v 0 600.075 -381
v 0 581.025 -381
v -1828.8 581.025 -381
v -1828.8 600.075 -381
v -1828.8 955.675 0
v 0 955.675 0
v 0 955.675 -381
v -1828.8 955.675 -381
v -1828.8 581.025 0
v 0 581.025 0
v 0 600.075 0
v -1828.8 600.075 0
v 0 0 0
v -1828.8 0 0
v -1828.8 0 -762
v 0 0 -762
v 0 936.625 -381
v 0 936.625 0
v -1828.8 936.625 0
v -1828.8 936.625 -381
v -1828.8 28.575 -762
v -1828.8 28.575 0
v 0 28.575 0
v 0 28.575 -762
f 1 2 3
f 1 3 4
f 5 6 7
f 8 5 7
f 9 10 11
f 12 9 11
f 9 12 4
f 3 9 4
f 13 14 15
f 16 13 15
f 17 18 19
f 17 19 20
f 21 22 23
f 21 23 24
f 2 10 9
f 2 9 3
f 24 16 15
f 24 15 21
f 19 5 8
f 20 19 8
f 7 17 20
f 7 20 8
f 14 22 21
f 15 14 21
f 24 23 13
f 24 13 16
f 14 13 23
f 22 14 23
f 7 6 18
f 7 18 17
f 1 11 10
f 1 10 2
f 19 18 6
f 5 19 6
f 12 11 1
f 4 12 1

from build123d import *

# Parameters (mm, degrees)
SKETCH1_W             = 762
SKETCH1_H             = 28.575
BOSS_EXTRUDE1_DEPTH   = 1828.8
SKETCH1_W_2           = 381
SKETCH1_H_2           = 19.05
BOSS_EXTRUDE1_2_DEPTH = 1828.8
BOSS_EXTRUDE1_3_DEPTH = 1828.8


with BuildPart() as part:
    # Sketch1 → Boss-Extrude1 (new body)
    with BuildSketch(Plane(origin=(0, 0, 0), x_dir=(0, 0, -1), z_dir=(1, 0, 0))):
        with Locations((381, 14.2875)):
            Rectangle(SKETCH1_W, SKETCH1_H)
    extrude(amount=-BOSS_EXTRUDE1_DEPTH)


with BuildPart() as body_2:
    # Sketch1 → Boss-Extrude1 2 (new body)
    with BuildSketch(Plane(origin=(0, 0, 0), x_dir=(0, 0, -1), z_dir=(1, 0, 0))):
        with Locations((190.5, 590.55)):
            Rectangle(SKETCH1_W_2, SKETCH1_H_2)
    extrude(amount=-BOSS_EXTRUDE1_2_DEPTH)


with BuildPart() as body_3:
    # Sketch1 → Boss-Extrude1 3 (new body)
    with BuildSketch(Plane(origin=(0, 0, 0), x_dir=(0, 0, -1), z_dir=(1, 0, 0))):
        with Locations((190.5, 946.15)):
            Rectangle(SKETCH1_W_2, SKETCH1_H_2)
    extrude(amount=-BOSS_EXTRUDE1_3_DEPTH)


solid = Compound([part.part, body_2.part, body_3.part])
